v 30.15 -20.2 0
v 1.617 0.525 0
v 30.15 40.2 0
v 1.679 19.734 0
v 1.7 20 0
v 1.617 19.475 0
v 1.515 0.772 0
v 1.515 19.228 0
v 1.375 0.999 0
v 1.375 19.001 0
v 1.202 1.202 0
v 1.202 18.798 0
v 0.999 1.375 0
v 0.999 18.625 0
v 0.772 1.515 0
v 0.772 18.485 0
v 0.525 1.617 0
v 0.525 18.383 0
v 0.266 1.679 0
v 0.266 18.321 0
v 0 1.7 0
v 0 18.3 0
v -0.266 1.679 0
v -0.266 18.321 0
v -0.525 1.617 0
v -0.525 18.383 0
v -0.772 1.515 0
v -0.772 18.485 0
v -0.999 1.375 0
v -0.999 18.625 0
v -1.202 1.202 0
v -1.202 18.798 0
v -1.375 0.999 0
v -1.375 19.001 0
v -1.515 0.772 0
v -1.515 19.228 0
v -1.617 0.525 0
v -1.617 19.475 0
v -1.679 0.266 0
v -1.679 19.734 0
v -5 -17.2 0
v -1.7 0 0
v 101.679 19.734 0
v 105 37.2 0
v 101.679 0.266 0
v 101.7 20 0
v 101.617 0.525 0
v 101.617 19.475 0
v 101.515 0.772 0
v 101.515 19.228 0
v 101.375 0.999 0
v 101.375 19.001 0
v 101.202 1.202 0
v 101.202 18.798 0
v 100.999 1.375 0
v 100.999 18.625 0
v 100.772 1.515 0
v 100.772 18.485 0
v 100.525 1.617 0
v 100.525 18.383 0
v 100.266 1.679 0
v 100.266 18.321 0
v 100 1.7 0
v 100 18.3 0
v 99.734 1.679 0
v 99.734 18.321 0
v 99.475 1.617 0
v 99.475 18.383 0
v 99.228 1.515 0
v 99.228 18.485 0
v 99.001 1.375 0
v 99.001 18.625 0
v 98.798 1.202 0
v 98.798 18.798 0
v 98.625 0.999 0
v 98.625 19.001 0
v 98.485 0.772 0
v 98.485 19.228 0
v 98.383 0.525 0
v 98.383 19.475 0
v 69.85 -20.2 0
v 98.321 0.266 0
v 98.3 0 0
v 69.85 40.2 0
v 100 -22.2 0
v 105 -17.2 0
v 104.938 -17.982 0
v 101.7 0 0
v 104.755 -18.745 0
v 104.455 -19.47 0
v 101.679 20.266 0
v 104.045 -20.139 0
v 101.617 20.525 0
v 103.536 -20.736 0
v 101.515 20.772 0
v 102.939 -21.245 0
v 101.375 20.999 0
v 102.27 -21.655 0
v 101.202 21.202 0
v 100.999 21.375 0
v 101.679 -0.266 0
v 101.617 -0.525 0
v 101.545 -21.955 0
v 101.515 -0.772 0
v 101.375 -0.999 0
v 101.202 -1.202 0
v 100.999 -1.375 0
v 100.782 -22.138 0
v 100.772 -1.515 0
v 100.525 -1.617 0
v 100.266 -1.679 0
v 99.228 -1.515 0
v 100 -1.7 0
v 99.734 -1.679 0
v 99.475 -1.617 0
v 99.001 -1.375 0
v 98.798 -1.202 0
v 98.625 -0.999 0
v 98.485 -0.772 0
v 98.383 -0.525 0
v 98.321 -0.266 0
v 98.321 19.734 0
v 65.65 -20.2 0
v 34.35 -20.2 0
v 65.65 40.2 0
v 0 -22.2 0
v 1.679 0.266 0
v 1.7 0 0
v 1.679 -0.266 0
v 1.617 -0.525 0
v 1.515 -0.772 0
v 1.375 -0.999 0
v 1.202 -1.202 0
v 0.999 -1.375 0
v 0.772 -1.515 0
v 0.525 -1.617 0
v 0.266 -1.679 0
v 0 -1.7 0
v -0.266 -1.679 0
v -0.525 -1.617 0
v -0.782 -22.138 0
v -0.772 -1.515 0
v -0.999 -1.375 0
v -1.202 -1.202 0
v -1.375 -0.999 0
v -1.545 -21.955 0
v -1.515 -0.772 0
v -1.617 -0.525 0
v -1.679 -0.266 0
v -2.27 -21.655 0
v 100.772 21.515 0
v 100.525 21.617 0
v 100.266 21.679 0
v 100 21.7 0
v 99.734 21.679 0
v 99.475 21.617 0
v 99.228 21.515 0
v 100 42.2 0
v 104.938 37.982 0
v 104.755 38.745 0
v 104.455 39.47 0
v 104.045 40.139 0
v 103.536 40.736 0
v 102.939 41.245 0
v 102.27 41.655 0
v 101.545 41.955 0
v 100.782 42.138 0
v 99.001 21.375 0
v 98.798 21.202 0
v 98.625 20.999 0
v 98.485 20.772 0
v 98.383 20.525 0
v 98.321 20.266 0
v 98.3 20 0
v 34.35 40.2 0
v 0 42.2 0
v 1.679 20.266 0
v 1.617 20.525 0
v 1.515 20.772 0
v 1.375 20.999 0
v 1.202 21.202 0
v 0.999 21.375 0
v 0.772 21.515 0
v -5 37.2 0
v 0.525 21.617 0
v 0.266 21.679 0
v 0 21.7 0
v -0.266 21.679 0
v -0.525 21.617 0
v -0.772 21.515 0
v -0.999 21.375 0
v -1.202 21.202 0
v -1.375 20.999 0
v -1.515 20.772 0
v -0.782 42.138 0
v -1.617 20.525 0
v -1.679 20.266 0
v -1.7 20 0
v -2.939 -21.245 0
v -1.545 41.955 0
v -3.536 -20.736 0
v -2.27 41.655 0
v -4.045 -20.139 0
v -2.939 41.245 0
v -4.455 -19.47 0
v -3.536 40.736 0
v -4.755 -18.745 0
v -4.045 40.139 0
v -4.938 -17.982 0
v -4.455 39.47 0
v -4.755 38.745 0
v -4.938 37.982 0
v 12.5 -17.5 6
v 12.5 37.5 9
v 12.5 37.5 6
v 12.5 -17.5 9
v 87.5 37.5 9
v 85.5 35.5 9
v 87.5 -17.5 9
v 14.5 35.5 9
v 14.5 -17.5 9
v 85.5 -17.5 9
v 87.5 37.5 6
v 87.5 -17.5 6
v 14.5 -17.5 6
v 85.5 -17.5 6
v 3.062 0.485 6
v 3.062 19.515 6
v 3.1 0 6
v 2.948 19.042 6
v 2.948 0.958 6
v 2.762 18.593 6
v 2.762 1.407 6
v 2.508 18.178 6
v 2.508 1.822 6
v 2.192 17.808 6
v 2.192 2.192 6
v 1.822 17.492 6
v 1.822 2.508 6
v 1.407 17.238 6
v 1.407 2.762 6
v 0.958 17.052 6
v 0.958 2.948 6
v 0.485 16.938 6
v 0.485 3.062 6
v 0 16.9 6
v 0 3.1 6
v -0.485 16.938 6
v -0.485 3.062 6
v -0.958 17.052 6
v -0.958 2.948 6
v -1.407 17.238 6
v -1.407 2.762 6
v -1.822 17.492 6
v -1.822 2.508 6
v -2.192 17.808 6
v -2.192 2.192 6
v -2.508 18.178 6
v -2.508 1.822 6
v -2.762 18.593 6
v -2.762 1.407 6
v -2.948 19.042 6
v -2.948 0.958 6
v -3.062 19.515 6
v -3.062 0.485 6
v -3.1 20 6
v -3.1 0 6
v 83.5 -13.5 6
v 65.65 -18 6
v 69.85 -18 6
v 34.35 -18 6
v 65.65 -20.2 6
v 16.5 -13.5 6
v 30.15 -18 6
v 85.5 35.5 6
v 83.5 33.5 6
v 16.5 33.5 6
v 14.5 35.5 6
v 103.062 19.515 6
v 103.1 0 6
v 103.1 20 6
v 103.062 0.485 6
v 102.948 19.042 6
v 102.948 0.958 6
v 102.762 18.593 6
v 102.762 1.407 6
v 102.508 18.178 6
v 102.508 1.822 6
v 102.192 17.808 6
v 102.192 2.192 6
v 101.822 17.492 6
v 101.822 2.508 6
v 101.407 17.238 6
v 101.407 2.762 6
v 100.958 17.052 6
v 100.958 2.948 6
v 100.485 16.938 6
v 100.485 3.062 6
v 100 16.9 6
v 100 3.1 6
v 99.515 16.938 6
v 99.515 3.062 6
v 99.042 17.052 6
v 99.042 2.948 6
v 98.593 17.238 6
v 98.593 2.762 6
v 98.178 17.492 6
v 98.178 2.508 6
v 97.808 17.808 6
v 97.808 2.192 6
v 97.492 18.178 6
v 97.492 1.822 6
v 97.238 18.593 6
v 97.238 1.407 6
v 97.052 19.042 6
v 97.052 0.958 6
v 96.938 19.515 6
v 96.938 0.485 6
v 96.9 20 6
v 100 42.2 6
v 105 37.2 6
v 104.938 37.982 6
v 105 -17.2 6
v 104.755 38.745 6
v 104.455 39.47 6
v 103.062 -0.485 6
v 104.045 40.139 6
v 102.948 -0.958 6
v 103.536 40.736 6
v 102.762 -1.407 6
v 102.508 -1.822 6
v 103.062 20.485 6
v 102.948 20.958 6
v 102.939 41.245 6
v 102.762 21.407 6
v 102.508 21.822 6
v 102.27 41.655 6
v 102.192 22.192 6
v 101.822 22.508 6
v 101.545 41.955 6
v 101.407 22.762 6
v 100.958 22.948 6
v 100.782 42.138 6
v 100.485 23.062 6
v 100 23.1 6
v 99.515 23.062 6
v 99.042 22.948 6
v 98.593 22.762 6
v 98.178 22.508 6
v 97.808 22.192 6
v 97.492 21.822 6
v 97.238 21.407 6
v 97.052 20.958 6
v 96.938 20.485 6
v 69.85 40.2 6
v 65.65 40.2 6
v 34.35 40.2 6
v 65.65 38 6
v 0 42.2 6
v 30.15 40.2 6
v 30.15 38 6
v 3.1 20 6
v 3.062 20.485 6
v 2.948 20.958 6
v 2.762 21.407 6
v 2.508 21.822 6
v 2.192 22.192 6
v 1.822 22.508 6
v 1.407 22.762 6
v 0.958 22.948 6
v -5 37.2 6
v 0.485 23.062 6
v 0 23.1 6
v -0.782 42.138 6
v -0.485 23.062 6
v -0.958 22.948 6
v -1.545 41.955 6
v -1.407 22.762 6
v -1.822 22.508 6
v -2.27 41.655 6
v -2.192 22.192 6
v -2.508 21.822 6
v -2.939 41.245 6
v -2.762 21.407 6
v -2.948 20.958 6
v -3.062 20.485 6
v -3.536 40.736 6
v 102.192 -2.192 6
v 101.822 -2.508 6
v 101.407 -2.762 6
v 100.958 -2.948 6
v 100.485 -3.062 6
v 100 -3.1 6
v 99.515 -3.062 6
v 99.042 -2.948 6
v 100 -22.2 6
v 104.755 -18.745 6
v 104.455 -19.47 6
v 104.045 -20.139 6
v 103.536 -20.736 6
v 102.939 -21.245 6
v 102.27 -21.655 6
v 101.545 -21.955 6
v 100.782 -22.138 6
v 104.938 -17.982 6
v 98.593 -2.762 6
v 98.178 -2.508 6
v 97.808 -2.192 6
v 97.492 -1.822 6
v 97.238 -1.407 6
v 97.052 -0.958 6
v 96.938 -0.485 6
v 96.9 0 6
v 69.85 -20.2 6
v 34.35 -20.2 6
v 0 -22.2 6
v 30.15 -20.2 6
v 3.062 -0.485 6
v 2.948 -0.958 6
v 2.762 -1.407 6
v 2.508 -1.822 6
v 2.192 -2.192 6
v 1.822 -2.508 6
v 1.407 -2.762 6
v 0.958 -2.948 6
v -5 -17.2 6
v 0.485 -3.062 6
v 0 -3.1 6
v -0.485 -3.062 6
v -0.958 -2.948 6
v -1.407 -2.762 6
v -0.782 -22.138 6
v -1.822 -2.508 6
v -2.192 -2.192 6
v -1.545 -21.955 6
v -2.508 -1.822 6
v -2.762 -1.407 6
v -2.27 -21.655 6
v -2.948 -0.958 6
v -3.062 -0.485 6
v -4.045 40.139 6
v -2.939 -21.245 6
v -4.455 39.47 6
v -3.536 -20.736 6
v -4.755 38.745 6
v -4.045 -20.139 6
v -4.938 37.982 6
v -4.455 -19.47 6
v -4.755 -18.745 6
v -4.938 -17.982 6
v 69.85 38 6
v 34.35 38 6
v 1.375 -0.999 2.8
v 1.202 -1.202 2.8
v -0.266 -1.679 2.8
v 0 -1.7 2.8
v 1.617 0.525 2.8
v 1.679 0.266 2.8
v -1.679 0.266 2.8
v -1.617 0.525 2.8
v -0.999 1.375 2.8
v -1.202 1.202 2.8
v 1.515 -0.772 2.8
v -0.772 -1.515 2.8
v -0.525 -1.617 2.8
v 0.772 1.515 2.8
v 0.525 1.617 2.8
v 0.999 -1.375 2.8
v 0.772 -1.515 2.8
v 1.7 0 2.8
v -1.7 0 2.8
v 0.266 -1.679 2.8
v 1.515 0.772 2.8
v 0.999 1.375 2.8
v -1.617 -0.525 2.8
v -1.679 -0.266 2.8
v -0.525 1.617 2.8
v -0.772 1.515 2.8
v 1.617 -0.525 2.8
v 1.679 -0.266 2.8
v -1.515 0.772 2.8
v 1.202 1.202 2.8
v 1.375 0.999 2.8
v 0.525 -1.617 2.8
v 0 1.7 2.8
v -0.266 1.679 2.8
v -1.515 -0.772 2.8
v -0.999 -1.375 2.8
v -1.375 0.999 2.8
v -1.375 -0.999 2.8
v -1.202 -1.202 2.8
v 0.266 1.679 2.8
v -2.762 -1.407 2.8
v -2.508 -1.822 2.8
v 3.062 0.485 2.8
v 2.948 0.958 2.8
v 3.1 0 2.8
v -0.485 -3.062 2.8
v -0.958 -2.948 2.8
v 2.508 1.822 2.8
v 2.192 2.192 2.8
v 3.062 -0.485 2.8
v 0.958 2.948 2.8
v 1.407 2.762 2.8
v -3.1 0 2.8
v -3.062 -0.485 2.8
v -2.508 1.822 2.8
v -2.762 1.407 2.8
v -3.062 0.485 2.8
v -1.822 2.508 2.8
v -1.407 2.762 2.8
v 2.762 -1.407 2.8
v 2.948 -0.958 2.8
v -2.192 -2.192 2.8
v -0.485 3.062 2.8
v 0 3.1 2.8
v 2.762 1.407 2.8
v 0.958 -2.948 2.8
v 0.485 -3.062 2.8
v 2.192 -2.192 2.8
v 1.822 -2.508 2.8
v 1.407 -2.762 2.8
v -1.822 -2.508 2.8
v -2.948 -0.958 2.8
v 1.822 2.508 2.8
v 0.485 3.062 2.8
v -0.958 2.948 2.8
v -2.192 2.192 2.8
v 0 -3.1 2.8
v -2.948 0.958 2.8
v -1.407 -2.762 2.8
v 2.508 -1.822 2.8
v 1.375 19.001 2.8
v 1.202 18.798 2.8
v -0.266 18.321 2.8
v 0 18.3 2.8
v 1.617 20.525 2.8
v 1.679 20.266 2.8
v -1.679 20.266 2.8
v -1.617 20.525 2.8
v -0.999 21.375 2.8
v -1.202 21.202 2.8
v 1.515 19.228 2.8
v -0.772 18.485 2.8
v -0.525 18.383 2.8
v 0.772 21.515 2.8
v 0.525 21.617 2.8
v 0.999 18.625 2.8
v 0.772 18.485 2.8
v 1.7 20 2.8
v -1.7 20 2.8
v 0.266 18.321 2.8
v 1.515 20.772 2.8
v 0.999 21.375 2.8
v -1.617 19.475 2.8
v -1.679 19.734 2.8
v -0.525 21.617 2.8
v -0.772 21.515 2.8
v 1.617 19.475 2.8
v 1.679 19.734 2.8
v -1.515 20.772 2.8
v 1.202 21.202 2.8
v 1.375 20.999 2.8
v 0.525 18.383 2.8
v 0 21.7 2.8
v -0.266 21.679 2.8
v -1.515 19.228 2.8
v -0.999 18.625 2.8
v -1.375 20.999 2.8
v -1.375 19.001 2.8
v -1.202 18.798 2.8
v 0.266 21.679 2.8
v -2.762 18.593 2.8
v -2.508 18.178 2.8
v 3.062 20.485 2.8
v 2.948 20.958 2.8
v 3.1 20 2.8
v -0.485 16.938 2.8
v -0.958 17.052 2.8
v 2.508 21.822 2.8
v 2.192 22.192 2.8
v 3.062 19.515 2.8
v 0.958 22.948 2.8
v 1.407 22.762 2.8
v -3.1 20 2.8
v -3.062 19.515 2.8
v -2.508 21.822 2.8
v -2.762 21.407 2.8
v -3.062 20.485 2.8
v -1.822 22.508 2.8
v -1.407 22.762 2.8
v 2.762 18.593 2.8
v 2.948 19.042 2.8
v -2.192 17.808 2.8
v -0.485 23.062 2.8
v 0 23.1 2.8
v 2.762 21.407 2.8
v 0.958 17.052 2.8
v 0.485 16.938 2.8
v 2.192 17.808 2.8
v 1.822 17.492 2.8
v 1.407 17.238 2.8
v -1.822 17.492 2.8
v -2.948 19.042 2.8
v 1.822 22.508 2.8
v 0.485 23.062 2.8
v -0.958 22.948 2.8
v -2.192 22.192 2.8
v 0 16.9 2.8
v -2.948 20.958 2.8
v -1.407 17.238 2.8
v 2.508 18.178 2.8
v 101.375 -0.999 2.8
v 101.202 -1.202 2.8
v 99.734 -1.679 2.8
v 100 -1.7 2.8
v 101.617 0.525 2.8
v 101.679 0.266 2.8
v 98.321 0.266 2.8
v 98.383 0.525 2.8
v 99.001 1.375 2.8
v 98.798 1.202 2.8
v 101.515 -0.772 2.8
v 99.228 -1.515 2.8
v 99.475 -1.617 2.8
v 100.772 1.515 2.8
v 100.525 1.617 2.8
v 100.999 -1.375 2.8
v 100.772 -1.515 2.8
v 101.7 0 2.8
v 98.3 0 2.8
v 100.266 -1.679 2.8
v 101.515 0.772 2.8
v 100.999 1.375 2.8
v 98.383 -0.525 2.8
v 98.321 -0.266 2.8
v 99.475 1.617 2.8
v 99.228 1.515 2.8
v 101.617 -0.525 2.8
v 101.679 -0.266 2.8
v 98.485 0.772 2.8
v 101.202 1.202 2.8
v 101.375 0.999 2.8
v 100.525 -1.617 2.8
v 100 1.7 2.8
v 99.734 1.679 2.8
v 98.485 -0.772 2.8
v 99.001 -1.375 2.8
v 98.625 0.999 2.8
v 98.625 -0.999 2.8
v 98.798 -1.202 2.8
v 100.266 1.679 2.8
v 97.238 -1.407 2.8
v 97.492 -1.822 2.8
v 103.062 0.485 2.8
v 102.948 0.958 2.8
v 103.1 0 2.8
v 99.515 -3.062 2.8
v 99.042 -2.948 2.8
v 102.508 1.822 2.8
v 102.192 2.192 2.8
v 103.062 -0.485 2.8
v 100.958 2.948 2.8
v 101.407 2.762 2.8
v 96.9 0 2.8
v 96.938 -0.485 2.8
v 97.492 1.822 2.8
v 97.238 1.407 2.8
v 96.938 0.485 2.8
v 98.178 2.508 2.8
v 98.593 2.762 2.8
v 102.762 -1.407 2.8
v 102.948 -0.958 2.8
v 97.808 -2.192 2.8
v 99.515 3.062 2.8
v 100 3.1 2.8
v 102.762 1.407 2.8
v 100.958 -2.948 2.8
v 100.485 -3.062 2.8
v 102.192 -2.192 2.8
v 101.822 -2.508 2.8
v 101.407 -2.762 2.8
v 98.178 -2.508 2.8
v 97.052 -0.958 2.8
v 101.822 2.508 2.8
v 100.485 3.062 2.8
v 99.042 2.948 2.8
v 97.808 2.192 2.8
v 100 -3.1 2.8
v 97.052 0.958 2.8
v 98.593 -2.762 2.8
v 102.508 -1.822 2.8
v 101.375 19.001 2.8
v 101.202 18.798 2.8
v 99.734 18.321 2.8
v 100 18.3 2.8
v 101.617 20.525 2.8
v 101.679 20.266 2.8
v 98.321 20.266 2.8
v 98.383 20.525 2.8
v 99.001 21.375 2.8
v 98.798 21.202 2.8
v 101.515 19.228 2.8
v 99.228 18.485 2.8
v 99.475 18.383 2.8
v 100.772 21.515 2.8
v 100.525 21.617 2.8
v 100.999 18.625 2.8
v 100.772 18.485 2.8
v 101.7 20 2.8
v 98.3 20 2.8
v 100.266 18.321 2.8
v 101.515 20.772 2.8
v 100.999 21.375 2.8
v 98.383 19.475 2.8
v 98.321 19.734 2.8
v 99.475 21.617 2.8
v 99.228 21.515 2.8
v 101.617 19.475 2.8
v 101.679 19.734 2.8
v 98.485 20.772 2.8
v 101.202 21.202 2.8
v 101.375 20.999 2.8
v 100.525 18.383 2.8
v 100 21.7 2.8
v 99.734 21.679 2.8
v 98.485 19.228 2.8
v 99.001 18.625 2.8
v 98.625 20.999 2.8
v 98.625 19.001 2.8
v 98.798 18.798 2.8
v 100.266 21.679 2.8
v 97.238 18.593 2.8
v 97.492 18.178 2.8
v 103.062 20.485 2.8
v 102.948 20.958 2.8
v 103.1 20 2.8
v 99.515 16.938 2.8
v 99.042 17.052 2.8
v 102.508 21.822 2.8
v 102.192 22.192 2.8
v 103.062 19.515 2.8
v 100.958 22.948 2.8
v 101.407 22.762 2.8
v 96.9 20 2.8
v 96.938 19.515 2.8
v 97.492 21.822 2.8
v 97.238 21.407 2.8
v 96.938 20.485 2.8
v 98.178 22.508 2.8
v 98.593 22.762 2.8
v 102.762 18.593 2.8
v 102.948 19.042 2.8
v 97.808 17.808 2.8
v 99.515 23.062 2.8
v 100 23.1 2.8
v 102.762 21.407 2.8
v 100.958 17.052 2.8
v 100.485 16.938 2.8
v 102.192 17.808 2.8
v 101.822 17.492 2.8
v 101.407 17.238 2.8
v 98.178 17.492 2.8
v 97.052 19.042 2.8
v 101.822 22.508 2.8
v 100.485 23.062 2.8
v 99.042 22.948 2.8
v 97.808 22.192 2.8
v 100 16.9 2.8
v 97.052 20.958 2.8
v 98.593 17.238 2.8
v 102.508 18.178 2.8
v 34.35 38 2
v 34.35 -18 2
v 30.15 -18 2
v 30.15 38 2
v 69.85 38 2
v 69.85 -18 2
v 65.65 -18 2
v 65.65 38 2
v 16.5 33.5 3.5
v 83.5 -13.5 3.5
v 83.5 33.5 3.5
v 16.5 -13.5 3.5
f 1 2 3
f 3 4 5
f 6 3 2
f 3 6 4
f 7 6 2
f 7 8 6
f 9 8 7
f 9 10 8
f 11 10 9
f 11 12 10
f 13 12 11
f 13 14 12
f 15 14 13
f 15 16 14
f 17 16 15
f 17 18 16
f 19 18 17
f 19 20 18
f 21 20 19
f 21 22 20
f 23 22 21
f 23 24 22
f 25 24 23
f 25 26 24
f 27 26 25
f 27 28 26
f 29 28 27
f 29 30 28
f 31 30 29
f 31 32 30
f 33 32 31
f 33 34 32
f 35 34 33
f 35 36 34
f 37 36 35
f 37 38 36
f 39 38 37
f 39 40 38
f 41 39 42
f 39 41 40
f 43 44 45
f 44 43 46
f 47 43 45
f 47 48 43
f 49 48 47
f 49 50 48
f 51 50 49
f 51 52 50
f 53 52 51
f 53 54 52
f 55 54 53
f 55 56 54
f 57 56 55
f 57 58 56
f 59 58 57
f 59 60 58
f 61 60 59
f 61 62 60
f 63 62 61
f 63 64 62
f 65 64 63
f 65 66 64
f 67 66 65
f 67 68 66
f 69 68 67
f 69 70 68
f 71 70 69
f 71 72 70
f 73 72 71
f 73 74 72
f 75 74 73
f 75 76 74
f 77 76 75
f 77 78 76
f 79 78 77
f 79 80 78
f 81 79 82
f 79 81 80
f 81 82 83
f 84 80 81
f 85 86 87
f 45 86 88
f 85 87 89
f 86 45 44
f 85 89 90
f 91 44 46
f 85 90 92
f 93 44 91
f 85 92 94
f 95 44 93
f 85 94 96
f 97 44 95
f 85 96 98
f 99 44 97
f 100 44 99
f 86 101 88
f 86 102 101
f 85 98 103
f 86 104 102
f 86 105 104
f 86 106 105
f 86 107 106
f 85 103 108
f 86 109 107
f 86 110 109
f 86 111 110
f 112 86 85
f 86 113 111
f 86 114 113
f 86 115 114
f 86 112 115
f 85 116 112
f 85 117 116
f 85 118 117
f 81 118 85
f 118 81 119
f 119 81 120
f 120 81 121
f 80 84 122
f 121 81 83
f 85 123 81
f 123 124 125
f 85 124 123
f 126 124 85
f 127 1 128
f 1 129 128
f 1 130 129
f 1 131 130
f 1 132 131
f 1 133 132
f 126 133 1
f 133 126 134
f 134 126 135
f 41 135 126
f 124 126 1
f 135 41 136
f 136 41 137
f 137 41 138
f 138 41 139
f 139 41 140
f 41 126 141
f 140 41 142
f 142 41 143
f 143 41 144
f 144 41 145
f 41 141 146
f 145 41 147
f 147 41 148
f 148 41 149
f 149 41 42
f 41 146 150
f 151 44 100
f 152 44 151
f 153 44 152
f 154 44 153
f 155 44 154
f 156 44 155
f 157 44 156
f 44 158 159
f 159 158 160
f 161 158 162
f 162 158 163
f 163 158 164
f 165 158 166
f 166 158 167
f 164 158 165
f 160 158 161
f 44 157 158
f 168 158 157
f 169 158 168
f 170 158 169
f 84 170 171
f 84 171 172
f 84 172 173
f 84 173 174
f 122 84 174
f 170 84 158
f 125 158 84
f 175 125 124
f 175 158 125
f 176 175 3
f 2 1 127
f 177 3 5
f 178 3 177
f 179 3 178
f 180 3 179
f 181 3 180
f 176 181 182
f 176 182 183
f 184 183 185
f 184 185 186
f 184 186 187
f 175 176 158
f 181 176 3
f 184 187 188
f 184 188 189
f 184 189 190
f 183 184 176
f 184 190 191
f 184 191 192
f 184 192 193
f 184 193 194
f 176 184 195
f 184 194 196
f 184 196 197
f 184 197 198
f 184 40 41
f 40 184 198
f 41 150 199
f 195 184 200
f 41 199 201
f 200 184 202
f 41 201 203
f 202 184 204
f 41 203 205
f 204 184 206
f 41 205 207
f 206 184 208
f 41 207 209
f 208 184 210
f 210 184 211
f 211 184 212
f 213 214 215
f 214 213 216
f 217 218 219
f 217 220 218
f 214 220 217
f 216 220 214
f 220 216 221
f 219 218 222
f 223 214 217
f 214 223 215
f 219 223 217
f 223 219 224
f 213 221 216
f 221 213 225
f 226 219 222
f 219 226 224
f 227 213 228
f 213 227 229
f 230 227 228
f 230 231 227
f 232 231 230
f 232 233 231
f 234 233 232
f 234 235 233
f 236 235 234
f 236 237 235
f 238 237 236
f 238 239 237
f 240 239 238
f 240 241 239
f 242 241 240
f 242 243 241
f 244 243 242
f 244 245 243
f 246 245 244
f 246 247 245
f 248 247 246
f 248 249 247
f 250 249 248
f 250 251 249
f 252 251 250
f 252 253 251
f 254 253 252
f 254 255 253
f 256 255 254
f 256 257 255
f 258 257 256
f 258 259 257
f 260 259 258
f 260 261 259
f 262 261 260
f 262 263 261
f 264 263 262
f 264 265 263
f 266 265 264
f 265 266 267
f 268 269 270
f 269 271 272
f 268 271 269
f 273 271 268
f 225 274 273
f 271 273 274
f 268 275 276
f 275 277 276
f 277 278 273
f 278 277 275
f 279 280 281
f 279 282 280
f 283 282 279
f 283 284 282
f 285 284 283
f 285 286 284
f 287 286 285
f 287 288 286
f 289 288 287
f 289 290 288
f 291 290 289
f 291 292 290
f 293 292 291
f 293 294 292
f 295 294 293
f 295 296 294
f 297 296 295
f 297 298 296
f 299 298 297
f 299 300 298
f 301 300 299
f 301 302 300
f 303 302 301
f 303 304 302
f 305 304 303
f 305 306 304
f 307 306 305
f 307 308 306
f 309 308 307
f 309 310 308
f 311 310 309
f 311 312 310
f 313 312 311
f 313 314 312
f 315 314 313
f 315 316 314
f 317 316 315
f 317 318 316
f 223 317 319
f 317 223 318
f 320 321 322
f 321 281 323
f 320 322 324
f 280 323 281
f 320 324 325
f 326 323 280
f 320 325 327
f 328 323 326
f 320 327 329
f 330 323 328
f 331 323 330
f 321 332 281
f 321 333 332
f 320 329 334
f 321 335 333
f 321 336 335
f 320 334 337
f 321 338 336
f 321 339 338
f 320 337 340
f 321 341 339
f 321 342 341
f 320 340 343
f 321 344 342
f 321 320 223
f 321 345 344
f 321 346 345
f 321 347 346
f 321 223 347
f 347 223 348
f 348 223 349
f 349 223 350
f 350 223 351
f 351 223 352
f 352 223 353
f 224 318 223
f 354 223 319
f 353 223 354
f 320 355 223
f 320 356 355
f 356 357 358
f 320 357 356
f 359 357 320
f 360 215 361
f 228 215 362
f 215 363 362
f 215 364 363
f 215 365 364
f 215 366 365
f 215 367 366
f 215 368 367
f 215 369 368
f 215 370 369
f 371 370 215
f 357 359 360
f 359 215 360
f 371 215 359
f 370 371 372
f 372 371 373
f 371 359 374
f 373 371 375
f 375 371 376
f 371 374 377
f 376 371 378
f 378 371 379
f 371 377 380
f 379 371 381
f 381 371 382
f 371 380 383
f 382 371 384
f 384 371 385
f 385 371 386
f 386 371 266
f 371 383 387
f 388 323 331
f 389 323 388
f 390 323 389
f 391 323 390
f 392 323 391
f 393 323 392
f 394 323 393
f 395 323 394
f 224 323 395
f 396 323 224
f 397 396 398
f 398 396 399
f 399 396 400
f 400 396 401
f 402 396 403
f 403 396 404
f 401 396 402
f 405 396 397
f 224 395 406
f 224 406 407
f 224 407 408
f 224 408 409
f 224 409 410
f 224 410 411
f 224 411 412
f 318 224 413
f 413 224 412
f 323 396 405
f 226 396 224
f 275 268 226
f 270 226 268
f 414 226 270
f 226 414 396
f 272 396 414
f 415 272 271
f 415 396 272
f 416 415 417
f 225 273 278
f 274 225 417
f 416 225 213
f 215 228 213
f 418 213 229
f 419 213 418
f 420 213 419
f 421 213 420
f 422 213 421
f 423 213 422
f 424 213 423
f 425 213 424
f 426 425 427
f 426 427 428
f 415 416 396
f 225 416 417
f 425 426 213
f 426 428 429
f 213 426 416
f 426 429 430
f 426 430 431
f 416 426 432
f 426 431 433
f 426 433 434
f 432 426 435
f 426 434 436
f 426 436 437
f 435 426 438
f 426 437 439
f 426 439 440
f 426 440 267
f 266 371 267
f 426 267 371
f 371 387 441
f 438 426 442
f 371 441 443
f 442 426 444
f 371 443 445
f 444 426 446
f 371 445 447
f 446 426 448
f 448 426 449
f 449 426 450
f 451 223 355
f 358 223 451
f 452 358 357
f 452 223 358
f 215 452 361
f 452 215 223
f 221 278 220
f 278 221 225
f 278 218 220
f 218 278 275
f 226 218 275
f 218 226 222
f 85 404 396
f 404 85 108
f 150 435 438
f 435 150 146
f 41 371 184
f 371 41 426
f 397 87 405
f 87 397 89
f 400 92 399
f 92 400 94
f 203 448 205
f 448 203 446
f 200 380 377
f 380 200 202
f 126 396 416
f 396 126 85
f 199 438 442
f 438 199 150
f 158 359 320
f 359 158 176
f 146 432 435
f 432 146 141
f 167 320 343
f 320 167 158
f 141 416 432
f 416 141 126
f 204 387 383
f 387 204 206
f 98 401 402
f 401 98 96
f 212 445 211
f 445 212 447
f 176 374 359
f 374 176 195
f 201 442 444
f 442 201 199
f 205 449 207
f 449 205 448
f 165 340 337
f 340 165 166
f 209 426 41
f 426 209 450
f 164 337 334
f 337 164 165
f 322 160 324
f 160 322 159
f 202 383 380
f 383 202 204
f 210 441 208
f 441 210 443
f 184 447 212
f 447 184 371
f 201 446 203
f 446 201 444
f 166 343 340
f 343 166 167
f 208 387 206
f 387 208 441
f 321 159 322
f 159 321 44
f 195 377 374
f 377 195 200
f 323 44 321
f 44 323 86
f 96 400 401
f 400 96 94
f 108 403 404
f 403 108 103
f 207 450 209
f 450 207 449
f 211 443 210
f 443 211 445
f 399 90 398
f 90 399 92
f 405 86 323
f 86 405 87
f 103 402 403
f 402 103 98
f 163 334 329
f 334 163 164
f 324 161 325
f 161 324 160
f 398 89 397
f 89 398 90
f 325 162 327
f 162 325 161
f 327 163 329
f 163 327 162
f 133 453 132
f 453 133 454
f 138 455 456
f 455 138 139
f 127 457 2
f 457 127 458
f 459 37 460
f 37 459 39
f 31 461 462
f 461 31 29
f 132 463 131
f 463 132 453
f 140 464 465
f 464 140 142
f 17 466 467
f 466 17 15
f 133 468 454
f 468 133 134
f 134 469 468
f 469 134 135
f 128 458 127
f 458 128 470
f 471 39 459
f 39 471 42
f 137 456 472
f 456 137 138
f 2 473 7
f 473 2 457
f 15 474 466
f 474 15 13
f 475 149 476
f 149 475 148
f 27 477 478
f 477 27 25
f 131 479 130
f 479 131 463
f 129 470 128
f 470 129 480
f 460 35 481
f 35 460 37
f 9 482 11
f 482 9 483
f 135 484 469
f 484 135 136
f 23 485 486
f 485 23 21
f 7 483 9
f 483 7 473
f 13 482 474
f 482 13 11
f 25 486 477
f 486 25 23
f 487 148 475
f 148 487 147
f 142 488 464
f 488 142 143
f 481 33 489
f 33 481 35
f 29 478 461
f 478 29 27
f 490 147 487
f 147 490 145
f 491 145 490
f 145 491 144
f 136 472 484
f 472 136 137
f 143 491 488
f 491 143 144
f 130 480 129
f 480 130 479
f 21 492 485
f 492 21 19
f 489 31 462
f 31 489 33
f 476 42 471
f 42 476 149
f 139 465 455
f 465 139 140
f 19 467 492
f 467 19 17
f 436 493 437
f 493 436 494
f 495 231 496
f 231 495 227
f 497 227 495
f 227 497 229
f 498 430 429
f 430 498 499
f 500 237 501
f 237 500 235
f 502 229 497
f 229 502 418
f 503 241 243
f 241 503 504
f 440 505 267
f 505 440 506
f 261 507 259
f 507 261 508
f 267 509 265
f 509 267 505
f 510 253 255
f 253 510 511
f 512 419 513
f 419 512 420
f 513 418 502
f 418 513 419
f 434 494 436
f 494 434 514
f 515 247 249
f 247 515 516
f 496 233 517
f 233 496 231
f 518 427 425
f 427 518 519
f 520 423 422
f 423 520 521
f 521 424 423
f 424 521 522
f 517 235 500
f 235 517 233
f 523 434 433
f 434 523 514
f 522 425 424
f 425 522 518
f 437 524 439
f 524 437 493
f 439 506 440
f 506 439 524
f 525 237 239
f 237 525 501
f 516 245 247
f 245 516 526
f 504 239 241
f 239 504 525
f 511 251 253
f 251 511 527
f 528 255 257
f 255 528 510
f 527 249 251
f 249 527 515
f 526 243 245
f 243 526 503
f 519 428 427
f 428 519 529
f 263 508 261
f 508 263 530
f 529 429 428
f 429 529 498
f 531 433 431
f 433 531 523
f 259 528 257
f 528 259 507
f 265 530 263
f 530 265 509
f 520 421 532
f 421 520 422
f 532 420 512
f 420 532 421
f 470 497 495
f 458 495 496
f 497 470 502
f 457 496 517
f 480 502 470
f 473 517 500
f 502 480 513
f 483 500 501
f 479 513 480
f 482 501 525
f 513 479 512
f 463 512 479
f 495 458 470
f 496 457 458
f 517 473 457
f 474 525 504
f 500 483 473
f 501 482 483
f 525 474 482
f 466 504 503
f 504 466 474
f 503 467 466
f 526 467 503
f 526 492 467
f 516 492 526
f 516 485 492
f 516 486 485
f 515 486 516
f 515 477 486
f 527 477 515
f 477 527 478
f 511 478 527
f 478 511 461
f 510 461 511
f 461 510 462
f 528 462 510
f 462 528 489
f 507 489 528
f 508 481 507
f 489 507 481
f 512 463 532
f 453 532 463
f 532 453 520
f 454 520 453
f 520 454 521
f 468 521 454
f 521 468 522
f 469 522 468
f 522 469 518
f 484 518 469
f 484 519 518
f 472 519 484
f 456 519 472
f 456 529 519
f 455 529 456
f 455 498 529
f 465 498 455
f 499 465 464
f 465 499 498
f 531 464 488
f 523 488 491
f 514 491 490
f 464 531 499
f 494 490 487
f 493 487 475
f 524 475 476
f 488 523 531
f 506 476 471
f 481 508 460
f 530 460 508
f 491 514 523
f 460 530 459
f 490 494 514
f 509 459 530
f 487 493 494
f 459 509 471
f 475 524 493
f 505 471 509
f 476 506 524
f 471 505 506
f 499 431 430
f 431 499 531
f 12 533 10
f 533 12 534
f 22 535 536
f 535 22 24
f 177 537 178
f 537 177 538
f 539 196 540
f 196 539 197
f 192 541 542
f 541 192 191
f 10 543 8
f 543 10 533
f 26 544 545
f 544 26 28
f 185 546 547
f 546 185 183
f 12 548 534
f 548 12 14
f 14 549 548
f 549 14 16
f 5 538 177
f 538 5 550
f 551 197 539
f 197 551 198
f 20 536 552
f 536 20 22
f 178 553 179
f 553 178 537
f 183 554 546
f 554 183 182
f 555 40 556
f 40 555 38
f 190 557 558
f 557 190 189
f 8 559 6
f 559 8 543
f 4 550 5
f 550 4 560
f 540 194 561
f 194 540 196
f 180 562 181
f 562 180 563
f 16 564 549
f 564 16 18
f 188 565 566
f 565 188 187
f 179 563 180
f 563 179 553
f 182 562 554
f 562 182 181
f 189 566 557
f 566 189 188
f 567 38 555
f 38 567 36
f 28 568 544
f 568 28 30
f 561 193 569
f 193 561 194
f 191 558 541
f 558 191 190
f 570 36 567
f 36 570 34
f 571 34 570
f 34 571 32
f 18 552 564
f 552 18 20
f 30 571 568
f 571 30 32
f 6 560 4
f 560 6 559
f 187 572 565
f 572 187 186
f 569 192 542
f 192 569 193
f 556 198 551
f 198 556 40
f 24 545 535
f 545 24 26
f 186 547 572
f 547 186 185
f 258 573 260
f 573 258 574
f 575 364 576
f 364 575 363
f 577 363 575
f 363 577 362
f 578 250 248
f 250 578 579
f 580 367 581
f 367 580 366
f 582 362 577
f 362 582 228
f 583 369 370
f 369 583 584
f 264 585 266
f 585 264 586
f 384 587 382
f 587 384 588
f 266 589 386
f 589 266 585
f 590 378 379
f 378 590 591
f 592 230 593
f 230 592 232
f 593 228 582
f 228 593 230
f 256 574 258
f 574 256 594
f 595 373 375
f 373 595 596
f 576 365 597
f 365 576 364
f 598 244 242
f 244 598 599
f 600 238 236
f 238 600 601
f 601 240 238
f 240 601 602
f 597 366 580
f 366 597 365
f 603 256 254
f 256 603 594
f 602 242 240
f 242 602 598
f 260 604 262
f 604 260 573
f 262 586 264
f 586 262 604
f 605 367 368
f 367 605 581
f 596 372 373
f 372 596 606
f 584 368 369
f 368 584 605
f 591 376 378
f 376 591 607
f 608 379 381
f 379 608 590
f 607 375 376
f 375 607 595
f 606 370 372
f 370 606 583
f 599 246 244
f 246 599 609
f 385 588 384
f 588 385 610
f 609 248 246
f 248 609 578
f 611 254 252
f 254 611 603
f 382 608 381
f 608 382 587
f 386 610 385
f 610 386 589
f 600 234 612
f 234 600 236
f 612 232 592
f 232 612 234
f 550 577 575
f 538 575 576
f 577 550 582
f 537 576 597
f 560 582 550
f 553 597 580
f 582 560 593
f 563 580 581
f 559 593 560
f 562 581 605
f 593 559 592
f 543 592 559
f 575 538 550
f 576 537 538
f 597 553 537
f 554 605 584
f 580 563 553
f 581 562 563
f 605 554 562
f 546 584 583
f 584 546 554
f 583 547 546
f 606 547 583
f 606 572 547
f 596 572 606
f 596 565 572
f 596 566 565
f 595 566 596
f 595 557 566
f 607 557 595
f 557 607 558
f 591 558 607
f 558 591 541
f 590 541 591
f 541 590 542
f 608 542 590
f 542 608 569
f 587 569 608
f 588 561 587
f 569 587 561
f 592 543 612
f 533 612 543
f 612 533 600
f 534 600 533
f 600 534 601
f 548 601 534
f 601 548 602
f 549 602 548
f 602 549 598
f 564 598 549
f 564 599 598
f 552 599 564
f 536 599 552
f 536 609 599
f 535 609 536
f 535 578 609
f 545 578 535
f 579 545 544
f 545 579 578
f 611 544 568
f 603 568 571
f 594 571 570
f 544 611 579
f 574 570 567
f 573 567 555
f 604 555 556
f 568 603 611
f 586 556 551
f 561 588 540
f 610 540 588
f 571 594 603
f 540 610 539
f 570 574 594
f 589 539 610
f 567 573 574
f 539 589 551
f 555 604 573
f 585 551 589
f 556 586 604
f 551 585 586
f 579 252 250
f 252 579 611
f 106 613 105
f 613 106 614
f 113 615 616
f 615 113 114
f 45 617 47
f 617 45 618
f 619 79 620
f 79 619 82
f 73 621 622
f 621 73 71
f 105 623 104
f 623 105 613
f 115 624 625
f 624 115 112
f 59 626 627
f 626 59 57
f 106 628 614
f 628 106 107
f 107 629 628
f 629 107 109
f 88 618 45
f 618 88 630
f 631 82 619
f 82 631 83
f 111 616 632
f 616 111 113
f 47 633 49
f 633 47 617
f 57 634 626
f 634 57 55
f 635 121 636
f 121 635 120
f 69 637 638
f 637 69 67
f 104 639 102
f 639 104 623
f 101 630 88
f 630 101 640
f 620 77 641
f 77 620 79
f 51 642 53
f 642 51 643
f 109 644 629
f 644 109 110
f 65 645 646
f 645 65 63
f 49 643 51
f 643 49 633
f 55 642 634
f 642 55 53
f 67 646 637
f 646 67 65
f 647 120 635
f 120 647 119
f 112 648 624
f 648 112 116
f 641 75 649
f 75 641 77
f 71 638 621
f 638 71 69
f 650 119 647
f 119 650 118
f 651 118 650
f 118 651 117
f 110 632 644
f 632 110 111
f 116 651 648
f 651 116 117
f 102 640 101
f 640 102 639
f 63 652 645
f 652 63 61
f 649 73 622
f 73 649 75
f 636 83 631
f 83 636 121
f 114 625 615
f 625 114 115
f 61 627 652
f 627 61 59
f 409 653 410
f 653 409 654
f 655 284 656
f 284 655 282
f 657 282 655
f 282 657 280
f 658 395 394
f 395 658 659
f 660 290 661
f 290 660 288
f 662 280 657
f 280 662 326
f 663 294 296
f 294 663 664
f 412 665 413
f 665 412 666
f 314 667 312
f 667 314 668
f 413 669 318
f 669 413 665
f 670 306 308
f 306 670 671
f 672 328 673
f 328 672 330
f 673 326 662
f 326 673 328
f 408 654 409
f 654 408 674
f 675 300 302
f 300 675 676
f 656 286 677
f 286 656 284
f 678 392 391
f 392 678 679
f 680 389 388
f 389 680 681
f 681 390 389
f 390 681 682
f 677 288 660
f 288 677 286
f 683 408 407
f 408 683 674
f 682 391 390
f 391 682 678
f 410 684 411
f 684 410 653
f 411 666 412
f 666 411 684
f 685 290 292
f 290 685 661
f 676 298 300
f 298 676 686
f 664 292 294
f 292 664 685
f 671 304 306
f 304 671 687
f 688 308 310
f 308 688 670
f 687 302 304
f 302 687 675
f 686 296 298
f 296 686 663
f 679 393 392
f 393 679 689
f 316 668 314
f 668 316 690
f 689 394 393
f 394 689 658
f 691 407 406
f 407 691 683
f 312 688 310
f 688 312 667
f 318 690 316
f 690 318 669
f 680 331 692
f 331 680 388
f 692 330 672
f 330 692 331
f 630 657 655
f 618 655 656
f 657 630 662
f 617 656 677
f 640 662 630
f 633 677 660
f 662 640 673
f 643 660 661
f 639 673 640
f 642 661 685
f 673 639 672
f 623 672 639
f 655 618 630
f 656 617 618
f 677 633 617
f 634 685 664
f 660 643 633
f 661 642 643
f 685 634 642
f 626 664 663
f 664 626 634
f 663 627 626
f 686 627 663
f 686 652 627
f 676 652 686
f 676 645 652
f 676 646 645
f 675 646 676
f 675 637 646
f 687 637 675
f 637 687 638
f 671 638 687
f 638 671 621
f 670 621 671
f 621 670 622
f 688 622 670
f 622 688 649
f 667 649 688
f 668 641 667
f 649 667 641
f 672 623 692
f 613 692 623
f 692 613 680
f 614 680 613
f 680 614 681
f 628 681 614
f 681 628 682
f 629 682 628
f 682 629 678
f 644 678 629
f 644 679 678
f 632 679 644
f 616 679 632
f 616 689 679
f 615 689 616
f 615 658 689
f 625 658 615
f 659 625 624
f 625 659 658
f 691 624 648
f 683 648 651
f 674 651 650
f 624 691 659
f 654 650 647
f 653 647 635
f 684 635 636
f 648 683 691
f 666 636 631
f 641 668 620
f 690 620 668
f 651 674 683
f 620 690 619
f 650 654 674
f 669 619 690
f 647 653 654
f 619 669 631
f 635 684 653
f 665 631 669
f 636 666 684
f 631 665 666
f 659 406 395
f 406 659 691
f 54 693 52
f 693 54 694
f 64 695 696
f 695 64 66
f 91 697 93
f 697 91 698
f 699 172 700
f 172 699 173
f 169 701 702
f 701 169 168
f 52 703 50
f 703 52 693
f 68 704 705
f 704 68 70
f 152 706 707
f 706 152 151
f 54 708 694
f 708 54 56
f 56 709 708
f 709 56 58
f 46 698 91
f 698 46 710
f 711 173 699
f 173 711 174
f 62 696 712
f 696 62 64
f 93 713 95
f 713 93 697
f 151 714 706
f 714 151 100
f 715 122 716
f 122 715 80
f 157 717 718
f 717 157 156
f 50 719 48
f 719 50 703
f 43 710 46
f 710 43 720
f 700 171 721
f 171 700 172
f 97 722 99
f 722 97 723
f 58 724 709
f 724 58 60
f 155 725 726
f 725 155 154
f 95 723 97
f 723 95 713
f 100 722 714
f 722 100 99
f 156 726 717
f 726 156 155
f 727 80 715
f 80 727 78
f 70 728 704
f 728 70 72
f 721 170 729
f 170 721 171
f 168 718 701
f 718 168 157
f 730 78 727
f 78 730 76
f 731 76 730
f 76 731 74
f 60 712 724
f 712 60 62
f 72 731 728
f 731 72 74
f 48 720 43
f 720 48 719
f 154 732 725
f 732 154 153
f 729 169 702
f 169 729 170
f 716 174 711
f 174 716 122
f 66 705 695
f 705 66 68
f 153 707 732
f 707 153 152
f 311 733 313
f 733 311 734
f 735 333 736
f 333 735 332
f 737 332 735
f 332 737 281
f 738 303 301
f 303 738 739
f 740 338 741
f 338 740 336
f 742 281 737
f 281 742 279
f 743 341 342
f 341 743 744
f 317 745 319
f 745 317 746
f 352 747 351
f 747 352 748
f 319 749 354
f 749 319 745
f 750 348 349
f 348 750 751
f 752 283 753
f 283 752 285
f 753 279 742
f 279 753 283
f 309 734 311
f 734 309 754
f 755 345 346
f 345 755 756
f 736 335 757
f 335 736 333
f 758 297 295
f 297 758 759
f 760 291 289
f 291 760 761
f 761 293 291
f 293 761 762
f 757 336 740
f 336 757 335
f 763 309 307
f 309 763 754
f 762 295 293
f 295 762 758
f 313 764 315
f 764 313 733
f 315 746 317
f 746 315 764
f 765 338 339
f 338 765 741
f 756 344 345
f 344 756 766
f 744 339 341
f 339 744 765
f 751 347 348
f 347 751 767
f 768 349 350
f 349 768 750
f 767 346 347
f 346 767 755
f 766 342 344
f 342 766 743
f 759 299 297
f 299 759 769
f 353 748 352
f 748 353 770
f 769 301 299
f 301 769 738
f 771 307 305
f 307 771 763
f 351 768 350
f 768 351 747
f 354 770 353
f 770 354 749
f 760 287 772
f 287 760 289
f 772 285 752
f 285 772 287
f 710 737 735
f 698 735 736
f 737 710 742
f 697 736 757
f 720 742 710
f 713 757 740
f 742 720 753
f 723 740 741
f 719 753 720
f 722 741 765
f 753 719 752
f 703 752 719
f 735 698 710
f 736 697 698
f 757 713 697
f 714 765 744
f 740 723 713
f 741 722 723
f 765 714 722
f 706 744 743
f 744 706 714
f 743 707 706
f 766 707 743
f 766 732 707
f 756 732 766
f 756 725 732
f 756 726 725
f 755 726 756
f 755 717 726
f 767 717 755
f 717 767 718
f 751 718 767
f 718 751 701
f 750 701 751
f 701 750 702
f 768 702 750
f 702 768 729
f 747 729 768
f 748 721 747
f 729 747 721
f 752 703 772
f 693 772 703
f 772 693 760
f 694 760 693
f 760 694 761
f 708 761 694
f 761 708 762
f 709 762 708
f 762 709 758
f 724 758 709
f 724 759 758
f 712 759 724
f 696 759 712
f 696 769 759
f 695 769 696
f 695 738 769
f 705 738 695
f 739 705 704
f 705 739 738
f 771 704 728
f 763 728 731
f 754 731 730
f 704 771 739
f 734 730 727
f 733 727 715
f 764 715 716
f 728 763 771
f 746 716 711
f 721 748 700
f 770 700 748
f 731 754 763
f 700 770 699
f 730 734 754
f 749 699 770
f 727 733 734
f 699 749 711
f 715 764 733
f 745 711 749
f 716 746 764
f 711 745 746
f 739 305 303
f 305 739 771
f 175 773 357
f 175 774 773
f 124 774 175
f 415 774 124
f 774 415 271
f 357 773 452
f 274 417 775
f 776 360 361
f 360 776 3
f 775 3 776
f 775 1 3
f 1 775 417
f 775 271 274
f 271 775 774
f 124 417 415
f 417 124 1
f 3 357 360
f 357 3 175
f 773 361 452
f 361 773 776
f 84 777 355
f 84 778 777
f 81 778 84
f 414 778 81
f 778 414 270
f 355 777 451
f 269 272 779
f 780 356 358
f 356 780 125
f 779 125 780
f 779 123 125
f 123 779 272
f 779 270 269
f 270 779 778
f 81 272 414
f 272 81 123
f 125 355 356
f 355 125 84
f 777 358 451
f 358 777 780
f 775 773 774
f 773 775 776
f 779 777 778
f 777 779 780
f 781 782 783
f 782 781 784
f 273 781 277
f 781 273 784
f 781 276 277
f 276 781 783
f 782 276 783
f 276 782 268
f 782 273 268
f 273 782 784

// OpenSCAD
include <../lib/apache-case-modules-lib.scad>;
$fn = 40;
carrier_tray_print();
